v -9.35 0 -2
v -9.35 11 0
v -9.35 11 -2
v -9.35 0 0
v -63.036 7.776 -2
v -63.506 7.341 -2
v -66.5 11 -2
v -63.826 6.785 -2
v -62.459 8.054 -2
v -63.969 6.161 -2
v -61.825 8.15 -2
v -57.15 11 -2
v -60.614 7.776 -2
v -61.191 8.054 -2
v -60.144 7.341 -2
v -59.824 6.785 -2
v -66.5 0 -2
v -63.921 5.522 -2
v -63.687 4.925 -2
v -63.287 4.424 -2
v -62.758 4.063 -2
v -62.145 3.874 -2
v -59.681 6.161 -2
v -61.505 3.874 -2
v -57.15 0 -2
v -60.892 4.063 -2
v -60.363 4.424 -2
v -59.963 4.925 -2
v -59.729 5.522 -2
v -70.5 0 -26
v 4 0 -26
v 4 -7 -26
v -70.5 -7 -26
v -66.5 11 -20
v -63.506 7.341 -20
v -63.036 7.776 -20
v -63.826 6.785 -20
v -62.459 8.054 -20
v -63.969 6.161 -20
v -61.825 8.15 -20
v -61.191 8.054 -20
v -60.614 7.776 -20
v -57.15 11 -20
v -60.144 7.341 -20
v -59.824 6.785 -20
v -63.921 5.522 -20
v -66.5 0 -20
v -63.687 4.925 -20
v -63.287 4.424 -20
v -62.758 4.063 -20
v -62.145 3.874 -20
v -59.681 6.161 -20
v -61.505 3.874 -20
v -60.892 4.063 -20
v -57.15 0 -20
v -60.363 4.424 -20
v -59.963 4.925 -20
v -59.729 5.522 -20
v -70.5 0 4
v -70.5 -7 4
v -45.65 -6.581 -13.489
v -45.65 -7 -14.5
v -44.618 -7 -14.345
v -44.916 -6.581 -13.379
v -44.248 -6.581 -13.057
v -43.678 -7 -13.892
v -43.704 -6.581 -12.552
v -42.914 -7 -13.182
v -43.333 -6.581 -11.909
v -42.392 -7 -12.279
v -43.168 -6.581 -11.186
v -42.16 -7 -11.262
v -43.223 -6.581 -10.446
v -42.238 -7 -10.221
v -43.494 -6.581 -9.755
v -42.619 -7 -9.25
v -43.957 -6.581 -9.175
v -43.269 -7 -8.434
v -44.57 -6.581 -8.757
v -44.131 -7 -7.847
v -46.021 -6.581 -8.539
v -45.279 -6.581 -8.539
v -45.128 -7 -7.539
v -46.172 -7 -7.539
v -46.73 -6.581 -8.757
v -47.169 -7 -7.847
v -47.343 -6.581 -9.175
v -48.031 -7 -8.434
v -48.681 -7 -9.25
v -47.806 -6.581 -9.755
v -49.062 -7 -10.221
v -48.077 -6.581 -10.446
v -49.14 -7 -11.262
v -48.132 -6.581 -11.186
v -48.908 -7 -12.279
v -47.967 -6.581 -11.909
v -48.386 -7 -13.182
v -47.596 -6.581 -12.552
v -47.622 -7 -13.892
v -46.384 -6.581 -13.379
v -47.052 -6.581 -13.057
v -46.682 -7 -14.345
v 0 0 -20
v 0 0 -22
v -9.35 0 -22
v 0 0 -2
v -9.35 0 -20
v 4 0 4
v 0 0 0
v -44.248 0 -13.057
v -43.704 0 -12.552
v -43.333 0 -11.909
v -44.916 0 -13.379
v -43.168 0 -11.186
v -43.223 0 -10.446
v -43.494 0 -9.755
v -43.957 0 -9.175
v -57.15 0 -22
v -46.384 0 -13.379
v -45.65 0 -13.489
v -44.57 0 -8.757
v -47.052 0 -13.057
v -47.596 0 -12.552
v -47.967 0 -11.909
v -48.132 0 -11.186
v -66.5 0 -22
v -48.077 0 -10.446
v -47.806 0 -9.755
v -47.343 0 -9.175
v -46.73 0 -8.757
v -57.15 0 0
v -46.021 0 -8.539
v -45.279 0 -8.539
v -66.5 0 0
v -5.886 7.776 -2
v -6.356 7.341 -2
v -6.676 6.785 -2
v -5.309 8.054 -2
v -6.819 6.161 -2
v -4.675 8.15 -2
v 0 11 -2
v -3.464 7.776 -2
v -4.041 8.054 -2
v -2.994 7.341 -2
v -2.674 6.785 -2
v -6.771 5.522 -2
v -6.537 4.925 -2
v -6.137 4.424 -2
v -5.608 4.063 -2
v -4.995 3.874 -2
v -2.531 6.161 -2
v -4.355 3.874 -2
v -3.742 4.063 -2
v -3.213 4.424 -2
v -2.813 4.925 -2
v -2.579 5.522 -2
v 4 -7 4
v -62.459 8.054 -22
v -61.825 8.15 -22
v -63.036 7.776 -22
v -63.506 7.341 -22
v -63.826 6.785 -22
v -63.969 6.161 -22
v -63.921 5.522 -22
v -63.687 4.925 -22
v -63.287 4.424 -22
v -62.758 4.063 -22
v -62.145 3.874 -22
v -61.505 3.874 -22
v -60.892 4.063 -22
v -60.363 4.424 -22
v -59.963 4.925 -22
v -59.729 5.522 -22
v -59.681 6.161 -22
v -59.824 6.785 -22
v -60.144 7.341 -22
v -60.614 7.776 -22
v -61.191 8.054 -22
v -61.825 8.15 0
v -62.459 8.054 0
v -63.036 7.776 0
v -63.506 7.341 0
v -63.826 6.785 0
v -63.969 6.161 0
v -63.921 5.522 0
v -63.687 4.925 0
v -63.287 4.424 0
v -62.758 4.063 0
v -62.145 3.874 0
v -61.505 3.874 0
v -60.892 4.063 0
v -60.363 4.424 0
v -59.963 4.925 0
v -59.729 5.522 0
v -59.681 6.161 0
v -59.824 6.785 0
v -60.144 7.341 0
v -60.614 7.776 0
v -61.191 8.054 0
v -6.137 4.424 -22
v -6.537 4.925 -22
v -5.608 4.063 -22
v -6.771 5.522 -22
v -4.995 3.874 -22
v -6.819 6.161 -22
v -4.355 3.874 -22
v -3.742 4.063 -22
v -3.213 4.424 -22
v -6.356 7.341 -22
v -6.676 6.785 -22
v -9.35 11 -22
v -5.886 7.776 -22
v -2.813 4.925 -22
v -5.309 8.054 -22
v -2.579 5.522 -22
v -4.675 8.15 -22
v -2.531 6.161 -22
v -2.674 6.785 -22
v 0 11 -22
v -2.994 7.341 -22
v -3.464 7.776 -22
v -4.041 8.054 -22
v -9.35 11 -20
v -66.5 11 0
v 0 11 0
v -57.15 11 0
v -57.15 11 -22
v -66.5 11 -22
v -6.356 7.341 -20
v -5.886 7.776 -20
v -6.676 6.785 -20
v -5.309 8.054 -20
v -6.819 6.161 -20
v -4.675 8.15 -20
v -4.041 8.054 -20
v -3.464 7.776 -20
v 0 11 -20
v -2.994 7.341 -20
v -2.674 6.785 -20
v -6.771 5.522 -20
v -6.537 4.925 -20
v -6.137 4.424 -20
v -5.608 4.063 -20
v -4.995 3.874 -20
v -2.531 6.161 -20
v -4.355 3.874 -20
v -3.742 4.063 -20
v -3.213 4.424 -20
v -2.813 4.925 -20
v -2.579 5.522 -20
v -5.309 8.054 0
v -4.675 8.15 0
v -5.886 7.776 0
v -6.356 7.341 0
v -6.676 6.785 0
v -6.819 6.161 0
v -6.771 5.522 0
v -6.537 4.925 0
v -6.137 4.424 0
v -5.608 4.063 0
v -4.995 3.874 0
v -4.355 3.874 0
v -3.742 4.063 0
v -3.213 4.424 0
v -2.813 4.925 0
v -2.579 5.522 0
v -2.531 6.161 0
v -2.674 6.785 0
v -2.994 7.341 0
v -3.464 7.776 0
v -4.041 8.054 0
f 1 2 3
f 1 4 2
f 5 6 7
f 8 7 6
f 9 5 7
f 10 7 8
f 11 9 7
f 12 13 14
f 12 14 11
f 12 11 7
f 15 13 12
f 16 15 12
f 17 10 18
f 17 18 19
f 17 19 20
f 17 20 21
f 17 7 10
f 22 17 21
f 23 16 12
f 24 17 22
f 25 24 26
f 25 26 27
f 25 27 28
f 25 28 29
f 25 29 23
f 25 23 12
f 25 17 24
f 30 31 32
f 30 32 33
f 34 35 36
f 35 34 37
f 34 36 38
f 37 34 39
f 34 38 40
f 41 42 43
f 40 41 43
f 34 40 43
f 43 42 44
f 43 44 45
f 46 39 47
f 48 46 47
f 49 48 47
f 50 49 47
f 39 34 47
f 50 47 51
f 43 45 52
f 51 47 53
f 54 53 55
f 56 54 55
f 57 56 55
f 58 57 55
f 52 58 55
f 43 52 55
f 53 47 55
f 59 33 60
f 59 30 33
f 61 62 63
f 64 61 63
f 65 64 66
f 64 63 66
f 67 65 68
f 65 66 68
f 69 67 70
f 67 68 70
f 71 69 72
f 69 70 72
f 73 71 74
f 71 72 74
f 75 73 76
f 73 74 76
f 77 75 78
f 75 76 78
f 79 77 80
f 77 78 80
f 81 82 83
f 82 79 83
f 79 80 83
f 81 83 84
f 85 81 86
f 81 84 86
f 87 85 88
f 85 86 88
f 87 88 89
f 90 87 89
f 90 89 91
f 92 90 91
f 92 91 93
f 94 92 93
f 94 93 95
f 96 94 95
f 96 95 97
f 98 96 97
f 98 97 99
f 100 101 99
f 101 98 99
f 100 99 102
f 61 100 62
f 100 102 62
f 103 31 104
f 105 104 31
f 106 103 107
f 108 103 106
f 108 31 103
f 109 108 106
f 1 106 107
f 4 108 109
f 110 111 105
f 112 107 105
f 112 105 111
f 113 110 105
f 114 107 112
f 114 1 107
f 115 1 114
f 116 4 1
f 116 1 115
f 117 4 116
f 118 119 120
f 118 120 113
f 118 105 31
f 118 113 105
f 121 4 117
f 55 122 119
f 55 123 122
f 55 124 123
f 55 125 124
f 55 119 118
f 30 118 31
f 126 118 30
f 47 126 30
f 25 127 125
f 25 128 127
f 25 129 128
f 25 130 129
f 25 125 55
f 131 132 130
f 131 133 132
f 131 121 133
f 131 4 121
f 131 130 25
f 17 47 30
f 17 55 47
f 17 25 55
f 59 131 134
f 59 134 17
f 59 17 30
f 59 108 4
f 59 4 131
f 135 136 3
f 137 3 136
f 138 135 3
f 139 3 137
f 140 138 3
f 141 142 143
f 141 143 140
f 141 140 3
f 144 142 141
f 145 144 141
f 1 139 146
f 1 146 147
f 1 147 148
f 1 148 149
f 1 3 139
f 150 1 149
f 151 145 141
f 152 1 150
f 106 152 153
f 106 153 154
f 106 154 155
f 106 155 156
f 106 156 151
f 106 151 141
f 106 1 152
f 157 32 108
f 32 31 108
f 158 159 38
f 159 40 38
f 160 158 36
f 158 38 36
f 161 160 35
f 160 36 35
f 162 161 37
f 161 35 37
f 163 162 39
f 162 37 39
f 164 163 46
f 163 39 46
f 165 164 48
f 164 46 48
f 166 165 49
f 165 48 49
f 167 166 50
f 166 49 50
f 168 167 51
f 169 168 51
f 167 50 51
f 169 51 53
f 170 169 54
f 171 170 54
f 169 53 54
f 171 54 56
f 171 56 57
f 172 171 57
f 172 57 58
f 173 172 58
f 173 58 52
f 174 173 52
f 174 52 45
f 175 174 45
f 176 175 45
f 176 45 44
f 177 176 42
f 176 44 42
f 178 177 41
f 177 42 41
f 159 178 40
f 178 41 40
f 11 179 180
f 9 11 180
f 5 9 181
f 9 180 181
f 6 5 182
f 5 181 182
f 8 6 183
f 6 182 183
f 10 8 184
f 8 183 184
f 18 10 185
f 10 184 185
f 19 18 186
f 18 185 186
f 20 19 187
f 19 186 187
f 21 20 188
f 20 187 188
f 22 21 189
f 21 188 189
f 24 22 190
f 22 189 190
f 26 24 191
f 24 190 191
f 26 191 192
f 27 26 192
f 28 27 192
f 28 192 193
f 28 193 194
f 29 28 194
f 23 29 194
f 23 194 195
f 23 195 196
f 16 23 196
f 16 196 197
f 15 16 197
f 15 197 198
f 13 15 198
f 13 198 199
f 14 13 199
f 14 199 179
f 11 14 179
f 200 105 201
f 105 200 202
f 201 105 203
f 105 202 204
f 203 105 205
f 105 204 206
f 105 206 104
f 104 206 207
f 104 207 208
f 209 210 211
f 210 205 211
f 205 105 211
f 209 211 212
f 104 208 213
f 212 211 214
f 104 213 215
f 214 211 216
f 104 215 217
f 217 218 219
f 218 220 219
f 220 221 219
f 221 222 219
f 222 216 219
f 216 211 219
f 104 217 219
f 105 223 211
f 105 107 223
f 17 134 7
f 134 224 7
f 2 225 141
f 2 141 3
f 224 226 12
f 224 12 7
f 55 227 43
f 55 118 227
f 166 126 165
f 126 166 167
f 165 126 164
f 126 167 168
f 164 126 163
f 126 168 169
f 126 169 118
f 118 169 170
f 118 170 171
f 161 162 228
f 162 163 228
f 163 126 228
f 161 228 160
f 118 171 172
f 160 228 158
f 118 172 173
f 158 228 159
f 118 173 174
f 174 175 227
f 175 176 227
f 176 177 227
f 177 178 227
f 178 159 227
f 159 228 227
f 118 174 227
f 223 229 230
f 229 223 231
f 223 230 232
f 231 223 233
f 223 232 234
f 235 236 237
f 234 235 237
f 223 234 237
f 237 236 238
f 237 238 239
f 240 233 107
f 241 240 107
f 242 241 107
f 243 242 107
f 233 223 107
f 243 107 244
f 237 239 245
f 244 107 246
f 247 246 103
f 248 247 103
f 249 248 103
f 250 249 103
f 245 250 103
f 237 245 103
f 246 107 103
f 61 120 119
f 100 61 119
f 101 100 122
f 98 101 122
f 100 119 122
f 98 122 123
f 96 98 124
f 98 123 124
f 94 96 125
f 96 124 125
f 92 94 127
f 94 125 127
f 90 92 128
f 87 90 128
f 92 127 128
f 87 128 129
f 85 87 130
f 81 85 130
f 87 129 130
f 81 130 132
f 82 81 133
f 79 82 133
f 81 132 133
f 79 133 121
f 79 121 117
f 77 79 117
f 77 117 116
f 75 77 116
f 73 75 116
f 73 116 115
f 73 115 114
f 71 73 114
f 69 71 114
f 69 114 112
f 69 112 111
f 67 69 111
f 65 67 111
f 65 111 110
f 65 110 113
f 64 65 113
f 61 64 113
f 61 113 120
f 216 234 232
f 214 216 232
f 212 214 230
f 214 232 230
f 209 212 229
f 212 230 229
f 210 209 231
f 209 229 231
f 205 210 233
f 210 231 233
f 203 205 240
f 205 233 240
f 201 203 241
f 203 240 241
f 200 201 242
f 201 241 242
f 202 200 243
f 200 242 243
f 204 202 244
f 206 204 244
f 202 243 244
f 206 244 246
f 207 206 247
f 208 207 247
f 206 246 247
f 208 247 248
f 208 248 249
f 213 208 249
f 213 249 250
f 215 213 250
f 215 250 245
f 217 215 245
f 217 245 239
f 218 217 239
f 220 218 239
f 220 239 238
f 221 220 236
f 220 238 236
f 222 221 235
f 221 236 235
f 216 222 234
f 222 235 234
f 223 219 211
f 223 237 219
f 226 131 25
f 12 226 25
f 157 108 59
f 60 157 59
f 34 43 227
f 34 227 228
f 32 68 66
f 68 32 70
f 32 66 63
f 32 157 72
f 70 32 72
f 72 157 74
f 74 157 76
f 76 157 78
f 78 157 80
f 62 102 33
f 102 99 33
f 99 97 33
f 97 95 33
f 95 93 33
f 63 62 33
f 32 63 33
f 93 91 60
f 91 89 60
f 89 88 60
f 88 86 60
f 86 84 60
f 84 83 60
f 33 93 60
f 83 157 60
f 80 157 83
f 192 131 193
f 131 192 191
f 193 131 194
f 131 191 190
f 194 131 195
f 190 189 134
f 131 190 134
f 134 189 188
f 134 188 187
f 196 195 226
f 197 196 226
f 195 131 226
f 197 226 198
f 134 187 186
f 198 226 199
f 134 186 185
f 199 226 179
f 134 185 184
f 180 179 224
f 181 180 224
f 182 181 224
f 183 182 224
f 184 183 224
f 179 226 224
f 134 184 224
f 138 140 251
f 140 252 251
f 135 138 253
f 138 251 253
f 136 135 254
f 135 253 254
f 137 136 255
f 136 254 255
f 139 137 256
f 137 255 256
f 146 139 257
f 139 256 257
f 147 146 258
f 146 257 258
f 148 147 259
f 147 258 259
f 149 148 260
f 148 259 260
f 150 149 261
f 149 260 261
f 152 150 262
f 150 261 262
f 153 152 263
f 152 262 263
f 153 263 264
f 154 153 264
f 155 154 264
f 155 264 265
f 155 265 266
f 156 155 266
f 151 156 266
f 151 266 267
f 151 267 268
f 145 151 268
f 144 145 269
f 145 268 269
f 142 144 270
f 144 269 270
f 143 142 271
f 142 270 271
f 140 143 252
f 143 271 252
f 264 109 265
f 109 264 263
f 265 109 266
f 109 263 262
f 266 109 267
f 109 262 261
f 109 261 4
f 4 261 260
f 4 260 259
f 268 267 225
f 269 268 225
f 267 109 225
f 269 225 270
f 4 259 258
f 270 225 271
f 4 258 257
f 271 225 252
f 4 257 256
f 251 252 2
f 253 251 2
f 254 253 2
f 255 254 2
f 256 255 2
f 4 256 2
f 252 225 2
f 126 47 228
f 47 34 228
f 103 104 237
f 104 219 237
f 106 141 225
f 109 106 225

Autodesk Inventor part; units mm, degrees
ref_plane "YZ Plane" through (0, 0, 0) normal (1, 0, 0) x (0, 1, 0)
ref_plane "XZ Plane" through (0, 0, 0) normal (0, 1, 0) x (-1, 0, 0)
ref_plane "XY Plane" through (0, 0, 0) normal (0, 0, 1) x (1, 0, 0)
sketch "Sketch1" plane through (0, 0, 0) normal (0, 1, 0) x (-1, 0, 0)
  line L0 (0, 0) -> (66.5, 0)
  line L1 (66.5, 0) -> (66.5, -22)
  line L2 (66.5, -22) -> (0, -22)
  line L3 (0, -22) -> (0, 0)
  line L4 (66.5, -2) -> (0, -2)
  line L5 (66.5, -20) -> (0, -20)
  line L6 (9.35, 0) -> (9.35, -2)
  line L7 (9.35, -20) -> (9.35, -22)
  line L8 (59.65, 0) -> (59.65, -2)
  line L9 (59.65, -20) -> (59.65, -22)
  line L10 (57.15, -22) -> (57.15, -20)
  line L11 (64, -22) -> (64, -20)
  line L12 (2.5, -22) -> (2.5, -20)
  line L13 (6.85, -22) -> (6.85, -20)
  line L14 (0, -11) -> (66.5, -11)
  line L15 (9.35, -2) -> (9.35, 0)
  line L16 (59.65, -2) -> (59.65, 0)
  line L17 (57.15, 0) -> (57.15, -2)
  line L18 (64, 0) -> (64, -2)
  line L19 (2.5, 0) -> (2.5, -2)
  line L20 (6.85, 0) -> (6.85, -2)
  line L21 (33.25, -2) -> (33.25, -20)
  line L22 (66.5, -22) -> (0, -22)
  line L23 (0, -22) -> (0, -26)
  line L24 (0, -26) -> (66.5, -26)
  line L25 (66.5, -26) -> (66.5, -22)
  line L26 (66.5, 0) -> (0, 0)
  line L27 (0, 0) -> (0, 4)
  line L28 (0, 4) -> (66.5, 4)
  line L29 (66.5, 4) -> (66.5, 0)
  line L30 (66.5, -26) -> (70.5, -26)
  line L31 (70.5, -26) -> (70.5, 4)
  line L32 (70.5, 4) -> (66.5, 4)
  line L33 (66.5, 4) -> (66.5, -26)
  line L34 (0, -26) -> (-4, -26)
  line L35 (-4, -26) -> (-4, 4)
  line L36 (-4, 4) -> (0, 4)
  line L37 (0, 4) -> (0, -26)
  point P0 (2.5, -21)
  point P1 (57.15, -21)
  point P2 (59.65, -21)
  point P3 (64, -21)
  point P4 (6.85, -21)
  point P5 (57.15, -2)
  point P6 (33.25, -11)
  point P7 (0, -22)
  point P8 (0, -22)
  dimension "d2" = 2
  dimension "d3" = 2
  dimension "d36" = 18
  dimension "d38" = 4.35
  dimension "d39" = 4.35
  dimension "d40" = 61.5
  dimension "d41" = 2.5
  dimension "d42" = 2.5
  dimension "d43" = 2.5
  dimension "d44" = 2.5
  dimension "d67" = 4
  dimension "d68" = 4
  dimension "d71" = 4
  dimension "d72" = 4
extrude "Extrusion2" add sketch "Sketch1" against normal blind 7 contours L0 L19 L4 L3 | L0 L20 L4 L19 | L4 L21 L14 L3 | L0 L6 L4 L20 | L14 L21 L5 L3 | L0 L17 L4 L6 | L5 L12 L2 L3 | L21 L4 L1 L14 | L14 L1 L5 L21 | L1 L4 L18 L0 | L0 L8 L4 L17 | L5 L13 L2 L12 | L5 L10 L2 L7 | L18 L4 L8 L0 | L5 L7 L2 L13 | L1 L2 L11 L5 | L5 L9 L2 L10 | L11 L2 L9 L5
extrude "Extrusion5" add sketch "Sketch1" along normal blind 11 contours L0 L19 L4 L3 | L0 L20 L4 L19 | L0 L6 L4 L20 | L5 L12 L2 L3 | L1 L4 L18 L0 | L0 L8 L4 L17 | L5 L13 L2 L12 | L18 L4 L8 L0 | L5 L7 L2 L13 | L1 L2 L11 L5 | L5 L9 L2 L10 | L11 L2 L9 L5
sketch "Sketch5" plane through (-66.5, -7, 0) normal (0, 0, 1) x (1, 0, 0)
  point P0 (66.5, 7)
sketch "Sketch6" plane through (-66.5, -7, 0) normal (0, 0, 1) x (1, 0, 0)
  point P0 (66.5, 7)
sketch "Sketch7" plane through (-66.5, -7, 0) normal (0, 0, 1) x (1, 0, 0)
  line L0 (66.5, 0) -> (66.5, 18) projected
  line L1 (57.15, 18) -> (66.5, 18) projected
  line L2 (0, 18) -> (9.35, 18) projected
  line L3 (9.35, 7) -> (9.35, 18) projected
  point P0 (66.5, 7)
  point P1 (61.825, 13)
  point P2 (4.675, 13)
  dimension "d55" = 4.675
  dimension "d56" = 5
  dimension "d57" = 5
  dimension "d58" = 4.675
sketch "Sketch8" plane through (0, -7, -22) normal (0, 0, -1) x (-1, 0, 0)
  point P0 (0, 7)
  point P1 (4.675, 13)
  point P2 (61.825, 13)
hole "Hole3" at (-4.675, 6, -22) at (-61.825, 6, -22) direction (0, 0, 1) diameter 4.3 end through all
extrude "Extrusion6" add sketch "Sketch1" against normal blind 7 contours L27 L28 L29 L0 | L2 L25 L24 L23
extrude "Extrusion7" add sketch "Sketch1" against normal blind 7 contours L3 L23 L34 L35 L36 L27 | L32 L31 L30 L25 L1 L29
sketch "Sketch9" plane through (0, -7, 0) normal (0, -1, 0) x (1, 0, 0)
  line L0 (-70.5, 4) -> (4, 4) projected
  line L1 (4, -26) -> (-70.5, -26) projected
  line L2 (-70.5, -26) -> (-70.5, 4) projected
  line L3 (4, -26) -> (4, 4) projected
  line L4 (4, 4) -> (-70.5, 4) projected
  line L5 (-45.65, 4) -> (-45.65, -26)
  line L6 (-70.5, -11) -> (4, -11)
  line L7 (4, 4) -> (4, -26) projected
  point P0 (0, 0)
  point P1 (-33.25, -11)
  point P2 (-45.65, -11)
  dimension "d91" = 24.85
hole "Hole4" at (-45.65, -7, -11) direction (0, 1, 0) diameter 4.9784 end through all countersink diameter 7 countersink angle 135 thread size "1/4-20 UNC" class "1B" standard "ANSI Unified Screw Threads"
properties part number "RadarMount_3DPrint"
